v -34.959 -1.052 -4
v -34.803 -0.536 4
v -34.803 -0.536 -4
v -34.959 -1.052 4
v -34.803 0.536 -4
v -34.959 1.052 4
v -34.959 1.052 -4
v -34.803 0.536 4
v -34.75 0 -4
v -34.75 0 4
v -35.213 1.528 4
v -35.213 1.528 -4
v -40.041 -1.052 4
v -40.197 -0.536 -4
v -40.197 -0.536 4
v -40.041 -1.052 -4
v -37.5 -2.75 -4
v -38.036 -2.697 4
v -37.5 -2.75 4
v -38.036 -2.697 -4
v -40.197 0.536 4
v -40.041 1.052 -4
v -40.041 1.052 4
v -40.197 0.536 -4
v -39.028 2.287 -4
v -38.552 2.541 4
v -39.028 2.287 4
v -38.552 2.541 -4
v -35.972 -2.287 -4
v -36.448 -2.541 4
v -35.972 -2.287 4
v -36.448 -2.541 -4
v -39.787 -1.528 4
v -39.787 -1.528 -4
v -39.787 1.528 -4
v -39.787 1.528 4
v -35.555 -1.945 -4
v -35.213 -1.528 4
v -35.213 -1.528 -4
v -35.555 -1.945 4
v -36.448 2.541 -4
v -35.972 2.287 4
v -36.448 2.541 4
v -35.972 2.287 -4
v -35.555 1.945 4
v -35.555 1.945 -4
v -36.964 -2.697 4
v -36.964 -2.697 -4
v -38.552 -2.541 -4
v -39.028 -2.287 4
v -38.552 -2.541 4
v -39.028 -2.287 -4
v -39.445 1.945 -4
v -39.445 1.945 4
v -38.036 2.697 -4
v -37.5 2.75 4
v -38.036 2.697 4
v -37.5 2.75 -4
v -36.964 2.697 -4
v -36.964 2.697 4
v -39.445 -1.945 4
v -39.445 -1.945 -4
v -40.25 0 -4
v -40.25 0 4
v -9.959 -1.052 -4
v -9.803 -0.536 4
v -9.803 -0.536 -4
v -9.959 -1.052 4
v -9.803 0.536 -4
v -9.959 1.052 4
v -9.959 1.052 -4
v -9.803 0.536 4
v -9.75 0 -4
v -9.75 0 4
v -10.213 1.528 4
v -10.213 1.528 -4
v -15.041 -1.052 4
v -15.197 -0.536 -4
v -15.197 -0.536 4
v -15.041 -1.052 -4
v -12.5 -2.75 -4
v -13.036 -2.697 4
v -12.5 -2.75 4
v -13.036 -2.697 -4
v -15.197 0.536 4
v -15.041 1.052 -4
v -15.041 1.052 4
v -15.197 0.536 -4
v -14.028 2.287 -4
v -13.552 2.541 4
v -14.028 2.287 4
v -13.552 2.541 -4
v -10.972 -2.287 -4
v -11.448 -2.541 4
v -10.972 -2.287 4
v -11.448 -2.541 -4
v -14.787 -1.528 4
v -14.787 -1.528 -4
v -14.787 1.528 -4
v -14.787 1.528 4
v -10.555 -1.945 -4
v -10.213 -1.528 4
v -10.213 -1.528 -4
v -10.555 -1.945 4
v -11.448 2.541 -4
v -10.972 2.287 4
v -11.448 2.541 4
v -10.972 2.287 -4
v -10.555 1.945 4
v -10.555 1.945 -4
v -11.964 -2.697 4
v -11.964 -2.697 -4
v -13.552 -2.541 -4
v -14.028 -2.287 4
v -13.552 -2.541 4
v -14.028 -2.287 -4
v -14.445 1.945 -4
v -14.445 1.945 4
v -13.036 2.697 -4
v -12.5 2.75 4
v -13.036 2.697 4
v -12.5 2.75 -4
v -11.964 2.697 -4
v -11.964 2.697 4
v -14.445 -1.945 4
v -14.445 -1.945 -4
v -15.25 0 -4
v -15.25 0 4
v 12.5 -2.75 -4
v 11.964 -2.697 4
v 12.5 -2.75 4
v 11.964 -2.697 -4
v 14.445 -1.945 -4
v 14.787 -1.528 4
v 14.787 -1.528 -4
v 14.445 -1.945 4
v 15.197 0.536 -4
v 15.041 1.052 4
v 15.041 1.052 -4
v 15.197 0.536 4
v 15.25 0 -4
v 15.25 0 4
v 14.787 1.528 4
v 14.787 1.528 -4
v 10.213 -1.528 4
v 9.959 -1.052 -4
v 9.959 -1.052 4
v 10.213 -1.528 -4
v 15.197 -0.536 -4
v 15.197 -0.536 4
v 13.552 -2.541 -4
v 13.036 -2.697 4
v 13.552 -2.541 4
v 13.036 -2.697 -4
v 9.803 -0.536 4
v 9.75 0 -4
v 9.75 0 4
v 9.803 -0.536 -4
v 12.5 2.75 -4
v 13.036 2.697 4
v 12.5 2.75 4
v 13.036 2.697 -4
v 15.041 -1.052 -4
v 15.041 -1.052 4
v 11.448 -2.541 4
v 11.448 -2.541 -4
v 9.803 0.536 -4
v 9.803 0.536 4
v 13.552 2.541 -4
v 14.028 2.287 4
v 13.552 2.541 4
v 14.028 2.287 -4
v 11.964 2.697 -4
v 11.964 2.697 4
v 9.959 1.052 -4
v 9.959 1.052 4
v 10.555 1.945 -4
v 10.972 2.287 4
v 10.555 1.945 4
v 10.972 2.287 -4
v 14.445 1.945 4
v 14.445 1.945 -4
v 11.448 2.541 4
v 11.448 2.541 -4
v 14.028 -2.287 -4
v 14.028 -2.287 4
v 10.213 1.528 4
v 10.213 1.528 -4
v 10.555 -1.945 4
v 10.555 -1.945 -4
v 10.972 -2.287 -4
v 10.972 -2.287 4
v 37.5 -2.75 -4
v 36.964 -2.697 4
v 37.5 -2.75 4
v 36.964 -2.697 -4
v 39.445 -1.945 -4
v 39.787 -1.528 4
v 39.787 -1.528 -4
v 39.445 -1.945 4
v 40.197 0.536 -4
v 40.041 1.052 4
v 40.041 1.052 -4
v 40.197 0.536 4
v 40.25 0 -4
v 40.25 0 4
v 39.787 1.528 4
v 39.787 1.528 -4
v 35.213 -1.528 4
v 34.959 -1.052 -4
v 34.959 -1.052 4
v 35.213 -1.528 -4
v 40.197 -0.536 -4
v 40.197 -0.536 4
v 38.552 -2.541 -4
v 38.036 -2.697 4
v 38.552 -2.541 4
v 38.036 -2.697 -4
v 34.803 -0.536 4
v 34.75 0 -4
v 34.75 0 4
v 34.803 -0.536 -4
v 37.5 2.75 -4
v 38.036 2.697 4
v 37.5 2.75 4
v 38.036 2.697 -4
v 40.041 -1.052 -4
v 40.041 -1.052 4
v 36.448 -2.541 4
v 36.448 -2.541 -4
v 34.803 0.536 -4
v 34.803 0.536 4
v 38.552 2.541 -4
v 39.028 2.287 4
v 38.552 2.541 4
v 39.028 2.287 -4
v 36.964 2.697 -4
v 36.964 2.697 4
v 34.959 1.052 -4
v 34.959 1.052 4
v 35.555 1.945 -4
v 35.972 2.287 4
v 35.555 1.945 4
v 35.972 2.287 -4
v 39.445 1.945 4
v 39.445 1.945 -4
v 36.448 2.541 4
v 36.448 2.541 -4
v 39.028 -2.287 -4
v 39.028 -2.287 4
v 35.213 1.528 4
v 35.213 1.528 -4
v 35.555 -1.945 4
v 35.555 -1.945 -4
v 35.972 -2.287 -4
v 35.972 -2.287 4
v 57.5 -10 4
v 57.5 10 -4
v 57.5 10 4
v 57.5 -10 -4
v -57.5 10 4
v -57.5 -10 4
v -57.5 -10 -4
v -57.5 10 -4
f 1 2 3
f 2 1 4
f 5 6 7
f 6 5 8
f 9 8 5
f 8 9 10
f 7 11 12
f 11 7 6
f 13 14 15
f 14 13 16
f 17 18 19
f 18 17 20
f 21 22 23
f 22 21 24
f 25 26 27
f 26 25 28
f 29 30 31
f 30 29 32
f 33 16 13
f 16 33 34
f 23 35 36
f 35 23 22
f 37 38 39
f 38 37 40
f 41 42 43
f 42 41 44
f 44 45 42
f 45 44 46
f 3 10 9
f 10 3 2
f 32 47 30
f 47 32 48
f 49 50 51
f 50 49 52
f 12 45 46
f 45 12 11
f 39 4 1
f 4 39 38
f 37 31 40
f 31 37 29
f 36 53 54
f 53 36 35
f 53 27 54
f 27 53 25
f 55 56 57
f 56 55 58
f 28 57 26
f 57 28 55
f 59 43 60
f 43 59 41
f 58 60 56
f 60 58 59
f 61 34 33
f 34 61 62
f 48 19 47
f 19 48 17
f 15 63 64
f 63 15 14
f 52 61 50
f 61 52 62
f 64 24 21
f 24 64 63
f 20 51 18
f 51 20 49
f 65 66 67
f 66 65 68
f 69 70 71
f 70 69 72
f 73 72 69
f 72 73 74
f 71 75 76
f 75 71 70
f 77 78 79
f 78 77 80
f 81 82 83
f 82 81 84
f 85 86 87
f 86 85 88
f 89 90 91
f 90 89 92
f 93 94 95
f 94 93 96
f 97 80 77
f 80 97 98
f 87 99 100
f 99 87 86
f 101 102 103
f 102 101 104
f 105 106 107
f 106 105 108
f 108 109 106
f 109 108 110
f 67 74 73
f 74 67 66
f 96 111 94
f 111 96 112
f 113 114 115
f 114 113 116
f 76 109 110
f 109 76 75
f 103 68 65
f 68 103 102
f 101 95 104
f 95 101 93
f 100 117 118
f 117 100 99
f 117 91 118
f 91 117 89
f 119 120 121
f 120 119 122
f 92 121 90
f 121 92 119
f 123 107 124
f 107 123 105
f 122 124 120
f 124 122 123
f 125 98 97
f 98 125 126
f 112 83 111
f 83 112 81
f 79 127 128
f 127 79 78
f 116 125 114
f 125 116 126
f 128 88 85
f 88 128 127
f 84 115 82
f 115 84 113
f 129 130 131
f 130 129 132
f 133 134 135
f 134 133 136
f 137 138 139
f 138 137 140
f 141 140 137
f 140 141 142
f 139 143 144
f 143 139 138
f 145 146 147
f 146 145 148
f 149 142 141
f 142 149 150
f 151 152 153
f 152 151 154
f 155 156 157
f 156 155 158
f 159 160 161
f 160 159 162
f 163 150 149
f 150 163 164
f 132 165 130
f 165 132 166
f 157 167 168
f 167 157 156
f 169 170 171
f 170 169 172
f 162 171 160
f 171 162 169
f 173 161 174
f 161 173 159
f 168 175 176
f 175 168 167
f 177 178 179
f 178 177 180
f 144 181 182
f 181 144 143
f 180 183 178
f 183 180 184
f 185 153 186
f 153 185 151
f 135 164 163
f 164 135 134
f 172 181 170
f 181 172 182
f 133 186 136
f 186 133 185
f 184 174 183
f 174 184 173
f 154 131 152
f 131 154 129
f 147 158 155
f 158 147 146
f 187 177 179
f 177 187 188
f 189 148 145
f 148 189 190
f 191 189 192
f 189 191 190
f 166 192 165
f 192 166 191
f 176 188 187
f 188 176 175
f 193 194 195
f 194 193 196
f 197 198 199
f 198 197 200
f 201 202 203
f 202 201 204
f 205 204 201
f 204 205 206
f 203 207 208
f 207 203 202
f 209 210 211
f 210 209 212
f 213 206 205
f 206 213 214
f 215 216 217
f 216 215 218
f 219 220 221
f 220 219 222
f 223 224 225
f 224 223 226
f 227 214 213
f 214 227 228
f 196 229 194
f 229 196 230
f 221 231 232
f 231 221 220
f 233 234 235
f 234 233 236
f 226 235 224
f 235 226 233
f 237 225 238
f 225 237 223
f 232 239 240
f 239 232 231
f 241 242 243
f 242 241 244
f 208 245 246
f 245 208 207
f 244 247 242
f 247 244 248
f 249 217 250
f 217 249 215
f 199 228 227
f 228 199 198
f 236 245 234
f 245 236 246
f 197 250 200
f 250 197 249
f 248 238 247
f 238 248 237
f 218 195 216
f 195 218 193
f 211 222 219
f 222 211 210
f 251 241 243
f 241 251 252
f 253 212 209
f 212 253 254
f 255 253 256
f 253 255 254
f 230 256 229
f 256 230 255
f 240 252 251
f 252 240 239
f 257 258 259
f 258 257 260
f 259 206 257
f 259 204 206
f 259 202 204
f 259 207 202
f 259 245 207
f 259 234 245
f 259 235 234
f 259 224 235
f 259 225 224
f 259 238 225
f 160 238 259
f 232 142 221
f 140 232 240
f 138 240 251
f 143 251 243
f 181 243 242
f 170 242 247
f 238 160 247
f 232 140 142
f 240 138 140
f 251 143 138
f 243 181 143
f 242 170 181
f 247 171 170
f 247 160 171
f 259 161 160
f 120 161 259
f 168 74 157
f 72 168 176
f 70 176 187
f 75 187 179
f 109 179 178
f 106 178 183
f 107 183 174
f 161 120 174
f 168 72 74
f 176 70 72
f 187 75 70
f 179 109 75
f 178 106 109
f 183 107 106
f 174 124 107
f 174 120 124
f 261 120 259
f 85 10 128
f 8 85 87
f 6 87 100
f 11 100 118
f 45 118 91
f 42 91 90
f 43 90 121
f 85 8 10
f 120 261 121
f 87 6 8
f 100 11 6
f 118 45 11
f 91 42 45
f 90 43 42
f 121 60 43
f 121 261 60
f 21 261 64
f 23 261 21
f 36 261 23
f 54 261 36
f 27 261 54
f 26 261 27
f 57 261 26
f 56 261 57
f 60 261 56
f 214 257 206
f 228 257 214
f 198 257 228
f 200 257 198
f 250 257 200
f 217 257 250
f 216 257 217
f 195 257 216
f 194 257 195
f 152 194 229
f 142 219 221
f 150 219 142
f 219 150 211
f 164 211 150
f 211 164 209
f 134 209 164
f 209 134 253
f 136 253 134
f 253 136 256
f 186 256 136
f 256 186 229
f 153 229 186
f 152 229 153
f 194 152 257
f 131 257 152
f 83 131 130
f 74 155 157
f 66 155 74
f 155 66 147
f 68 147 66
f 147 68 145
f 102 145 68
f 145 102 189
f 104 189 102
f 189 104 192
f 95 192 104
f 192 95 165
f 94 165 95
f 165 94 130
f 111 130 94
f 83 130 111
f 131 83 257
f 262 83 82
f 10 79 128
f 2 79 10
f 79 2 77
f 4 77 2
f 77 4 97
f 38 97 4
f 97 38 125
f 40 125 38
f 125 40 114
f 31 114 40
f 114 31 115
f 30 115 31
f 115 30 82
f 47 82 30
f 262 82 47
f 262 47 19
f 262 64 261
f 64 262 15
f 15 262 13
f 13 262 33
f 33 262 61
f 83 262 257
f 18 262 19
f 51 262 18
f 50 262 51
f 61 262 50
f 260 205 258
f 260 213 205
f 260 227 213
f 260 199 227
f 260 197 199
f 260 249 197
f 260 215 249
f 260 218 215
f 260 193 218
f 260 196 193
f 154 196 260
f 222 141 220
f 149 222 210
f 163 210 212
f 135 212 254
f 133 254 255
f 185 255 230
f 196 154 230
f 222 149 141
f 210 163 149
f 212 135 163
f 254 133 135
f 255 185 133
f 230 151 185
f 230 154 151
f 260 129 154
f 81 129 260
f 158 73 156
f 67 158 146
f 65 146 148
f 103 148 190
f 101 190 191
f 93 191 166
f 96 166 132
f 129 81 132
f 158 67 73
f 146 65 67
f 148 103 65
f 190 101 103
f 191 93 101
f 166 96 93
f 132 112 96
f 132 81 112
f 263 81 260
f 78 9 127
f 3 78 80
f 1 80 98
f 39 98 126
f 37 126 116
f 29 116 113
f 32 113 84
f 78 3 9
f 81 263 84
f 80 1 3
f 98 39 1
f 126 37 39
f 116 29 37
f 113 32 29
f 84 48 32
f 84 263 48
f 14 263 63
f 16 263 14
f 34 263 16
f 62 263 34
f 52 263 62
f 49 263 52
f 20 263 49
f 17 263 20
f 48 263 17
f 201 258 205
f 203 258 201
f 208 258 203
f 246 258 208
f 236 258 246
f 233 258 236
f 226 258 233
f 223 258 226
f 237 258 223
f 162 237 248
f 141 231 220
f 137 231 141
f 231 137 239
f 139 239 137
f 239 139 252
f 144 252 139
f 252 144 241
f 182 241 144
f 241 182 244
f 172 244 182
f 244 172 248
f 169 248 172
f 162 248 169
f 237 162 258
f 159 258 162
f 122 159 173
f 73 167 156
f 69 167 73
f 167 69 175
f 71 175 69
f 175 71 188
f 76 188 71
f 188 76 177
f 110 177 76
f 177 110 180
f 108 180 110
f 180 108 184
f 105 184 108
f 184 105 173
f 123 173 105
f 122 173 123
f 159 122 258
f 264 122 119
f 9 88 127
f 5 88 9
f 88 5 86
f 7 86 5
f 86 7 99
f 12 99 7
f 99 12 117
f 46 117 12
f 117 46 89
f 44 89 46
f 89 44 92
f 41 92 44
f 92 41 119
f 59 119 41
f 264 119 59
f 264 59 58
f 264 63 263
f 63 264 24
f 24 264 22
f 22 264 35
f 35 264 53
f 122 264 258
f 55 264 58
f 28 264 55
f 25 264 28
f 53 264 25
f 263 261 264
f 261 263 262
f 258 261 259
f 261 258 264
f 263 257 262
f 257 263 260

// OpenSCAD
$fn = 32;

// ----------------------------------------------------------------------
// Hole bar, 4 x Ø5.5
// skip layout, 20 mm edge offset
// ----------------------------------------------------------------------

// --- parameters (mm) ---
bar_w = 20;         // bar width (Y)
bar_t = 8;          // bar thickness (Z)
holes = 4;          // holes per row
hole_d = 5.5;       // hole diameter
edge = 20;          // offset from the bar end to the first hole
grid_pitch = 12.5;  // grid the bar was laid out on

// --- derived feature positions (mm) ---
pitch = grid_pitch * 2;       // = 25   holes sit every other grid slot
span = (holes - 1) * pitch;   // = 75   distance between the end holes
bar_l = span + 2 * edge;      // = 115   overall bar length
start_x = -bar_l / 2 + edge;  // = -37.5   X of the first hole
feature_centers = [
  [start_x + 0 * pitch, 0],
  [start_x + 1 * pitch, 0],
  [start_x + 2 * pitch, 0],
  [start_x + 3 * pitch, 0]
];   // hole centres of the first row

// bar with one row of holes, drilled from feature_centers
difference() {
  translate([-bar_l / 2, -bar_w / 2, -bar_t / 2]) cube([bar_l, bar_w, bar_t]);
  for (centre = feature_centers)
    translate([centre[0], centre[1], 0])
      cylinder(d = hole_d, h = bar_t + 2, center = true);
}
